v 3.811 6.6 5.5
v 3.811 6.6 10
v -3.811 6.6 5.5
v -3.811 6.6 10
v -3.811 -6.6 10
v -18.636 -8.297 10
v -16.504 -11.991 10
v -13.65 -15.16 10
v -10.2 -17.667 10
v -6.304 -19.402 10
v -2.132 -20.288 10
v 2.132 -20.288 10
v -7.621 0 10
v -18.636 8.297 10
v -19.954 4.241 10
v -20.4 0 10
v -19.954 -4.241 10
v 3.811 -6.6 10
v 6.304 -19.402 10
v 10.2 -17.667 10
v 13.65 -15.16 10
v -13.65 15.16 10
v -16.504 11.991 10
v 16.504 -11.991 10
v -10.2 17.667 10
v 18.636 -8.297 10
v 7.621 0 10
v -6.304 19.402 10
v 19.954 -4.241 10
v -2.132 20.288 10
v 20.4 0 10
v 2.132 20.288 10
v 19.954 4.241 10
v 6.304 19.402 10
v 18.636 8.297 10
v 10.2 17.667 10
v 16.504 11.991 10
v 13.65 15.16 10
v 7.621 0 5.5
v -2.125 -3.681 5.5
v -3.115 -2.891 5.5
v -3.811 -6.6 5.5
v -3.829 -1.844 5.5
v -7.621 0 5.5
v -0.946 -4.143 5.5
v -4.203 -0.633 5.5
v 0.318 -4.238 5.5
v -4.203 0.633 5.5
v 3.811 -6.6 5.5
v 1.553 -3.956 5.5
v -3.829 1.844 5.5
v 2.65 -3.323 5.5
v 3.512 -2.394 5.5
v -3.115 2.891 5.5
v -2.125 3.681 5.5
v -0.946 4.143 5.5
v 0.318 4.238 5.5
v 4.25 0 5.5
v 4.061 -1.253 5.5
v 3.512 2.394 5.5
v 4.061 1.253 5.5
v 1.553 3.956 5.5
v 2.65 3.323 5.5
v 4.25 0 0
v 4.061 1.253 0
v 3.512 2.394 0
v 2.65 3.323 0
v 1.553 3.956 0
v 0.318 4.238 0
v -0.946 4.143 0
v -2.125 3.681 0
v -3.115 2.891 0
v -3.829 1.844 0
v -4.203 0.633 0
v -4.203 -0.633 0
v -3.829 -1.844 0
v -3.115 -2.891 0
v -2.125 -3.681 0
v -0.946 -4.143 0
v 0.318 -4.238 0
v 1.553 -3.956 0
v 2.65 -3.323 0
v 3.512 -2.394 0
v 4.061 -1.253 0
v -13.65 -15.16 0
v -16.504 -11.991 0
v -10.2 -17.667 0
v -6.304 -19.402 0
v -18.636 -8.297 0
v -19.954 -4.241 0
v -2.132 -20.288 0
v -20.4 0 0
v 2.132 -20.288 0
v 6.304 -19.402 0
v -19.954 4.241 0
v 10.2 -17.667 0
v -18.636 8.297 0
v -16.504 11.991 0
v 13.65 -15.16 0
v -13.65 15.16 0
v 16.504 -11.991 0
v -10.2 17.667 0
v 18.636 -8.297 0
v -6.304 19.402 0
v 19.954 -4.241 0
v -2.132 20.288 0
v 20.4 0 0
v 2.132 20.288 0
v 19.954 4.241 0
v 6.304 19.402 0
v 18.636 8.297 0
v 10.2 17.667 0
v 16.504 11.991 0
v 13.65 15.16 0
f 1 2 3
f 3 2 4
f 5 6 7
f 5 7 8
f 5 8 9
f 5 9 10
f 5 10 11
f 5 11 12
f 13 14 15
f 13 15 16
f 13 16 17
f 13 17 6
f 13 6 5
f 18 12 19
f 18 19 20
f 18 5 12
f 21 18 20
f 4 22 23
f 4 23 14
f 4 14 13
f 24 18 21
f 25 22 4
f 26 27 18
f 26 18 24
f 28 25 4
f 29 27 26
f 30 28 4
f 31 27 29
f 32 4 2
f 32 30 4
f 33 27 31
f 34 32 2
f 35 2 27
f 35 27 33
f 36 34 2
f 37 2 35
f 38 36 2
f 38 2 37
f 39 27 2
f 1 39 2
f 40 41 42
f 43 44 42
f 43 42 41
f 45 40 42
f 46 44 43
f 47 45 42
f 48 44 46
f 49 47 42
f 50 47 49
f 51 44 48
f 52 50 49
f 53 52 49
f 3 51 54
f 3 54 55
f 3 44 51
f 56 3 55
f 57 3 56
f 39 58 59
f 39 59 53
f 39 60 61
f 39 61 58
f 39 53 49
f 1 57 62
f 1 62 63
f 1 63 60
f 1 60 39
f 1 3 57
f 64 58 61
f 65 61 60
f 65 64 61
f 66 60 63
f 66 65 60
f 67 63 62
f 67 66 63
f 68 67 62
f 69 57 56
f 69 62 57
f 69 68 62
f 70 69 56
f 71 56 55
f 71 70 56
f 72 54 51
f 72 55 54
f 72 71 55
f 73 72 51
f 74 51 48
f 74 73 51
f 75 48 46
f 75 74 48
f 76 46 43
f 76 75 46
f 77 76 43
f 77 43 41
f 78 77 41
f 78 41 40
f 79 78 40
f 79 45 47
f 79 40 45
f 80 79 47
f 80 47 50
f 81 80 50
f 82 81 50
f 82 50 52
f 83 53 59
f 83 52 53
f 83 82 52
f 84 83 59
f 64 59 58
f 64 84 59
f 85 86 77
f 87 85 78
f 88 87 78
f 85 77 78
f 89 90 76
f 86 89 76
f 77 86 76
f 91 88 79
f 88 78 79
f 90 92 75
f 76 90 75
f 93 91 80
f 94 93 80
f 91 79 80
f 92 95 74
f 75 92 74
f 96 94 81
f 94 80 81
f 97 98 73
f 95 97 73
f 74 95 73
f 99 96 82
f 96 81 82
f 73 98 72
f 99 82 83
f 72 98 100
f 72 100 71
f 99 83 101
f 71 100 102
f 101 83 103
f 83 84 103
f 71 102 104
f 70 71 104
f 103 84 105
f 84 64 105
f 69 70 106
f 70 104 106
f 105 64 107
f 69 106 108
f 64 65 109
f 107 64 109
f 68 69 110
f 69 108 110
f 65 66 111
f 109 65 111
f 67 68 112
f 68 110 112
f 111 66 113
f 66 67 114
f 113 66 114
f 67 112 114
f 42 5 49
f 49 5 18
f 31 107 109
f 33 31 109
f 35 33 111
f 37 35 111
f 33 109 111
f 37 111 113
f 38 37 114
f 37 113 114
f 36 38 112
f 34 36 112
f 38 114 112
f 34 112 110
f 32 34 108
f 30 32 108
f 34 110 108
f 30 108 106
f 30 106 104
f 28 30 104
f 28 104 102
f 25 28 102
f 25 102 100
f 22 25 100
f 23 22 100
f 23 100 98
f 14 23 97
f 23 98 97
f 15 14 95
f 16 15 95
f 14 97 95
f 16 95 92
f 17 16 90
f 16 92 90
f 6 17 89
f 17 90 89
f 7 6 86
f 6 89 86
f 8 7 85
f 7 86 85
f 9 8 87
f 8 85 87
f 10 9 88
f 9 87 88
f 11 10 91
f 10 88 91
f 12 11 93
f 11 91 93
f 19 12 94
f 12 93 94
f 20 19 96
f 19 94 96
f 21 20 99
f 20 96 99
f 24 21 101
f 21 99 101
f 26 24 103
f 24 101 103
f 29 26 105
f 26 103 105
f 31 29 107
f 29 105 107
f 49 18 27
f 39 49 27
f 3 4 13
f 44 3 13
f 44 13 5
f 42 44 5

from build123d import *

# Parameters (mm, degrees)
ESBO_O1_R                = 20.4
ESBO_O1_R_2              = 4.25
RESSALTO_EXTRUS_O1_DEPTH = 10
CORTE_EXTRUS_O1_DEPTH    = 4.5


with BuildPart() as part:
    # Esboço1 → Ressalto-extrusão1 (new body)
    with BuildSketch(Plane.XY):
        Circle(ESBO_O1_R)
        Circle(ESBO_O1_R_2, mode=Mode.SUBTRACT)
    extrude(amount=RESSALTO_EXTRUS_O1_DEPTH)

    # Esboço2 → Corte-extrusão1 (cut)
    with BuildSketch(Plane.XY.offset(10)):
        Polygon((3.810511777, -6.6), (7.621023553, 0), (3.810511777, 6.6), (-3.810511777, 6.6), (-7.621023553, 0), (-3.810511777, -6.6), align=None)
    extrude(amount=-CORTE_EXTRUS_O1_DEPTH, mode=Mode.SUBTRACT)


solid = part.part
